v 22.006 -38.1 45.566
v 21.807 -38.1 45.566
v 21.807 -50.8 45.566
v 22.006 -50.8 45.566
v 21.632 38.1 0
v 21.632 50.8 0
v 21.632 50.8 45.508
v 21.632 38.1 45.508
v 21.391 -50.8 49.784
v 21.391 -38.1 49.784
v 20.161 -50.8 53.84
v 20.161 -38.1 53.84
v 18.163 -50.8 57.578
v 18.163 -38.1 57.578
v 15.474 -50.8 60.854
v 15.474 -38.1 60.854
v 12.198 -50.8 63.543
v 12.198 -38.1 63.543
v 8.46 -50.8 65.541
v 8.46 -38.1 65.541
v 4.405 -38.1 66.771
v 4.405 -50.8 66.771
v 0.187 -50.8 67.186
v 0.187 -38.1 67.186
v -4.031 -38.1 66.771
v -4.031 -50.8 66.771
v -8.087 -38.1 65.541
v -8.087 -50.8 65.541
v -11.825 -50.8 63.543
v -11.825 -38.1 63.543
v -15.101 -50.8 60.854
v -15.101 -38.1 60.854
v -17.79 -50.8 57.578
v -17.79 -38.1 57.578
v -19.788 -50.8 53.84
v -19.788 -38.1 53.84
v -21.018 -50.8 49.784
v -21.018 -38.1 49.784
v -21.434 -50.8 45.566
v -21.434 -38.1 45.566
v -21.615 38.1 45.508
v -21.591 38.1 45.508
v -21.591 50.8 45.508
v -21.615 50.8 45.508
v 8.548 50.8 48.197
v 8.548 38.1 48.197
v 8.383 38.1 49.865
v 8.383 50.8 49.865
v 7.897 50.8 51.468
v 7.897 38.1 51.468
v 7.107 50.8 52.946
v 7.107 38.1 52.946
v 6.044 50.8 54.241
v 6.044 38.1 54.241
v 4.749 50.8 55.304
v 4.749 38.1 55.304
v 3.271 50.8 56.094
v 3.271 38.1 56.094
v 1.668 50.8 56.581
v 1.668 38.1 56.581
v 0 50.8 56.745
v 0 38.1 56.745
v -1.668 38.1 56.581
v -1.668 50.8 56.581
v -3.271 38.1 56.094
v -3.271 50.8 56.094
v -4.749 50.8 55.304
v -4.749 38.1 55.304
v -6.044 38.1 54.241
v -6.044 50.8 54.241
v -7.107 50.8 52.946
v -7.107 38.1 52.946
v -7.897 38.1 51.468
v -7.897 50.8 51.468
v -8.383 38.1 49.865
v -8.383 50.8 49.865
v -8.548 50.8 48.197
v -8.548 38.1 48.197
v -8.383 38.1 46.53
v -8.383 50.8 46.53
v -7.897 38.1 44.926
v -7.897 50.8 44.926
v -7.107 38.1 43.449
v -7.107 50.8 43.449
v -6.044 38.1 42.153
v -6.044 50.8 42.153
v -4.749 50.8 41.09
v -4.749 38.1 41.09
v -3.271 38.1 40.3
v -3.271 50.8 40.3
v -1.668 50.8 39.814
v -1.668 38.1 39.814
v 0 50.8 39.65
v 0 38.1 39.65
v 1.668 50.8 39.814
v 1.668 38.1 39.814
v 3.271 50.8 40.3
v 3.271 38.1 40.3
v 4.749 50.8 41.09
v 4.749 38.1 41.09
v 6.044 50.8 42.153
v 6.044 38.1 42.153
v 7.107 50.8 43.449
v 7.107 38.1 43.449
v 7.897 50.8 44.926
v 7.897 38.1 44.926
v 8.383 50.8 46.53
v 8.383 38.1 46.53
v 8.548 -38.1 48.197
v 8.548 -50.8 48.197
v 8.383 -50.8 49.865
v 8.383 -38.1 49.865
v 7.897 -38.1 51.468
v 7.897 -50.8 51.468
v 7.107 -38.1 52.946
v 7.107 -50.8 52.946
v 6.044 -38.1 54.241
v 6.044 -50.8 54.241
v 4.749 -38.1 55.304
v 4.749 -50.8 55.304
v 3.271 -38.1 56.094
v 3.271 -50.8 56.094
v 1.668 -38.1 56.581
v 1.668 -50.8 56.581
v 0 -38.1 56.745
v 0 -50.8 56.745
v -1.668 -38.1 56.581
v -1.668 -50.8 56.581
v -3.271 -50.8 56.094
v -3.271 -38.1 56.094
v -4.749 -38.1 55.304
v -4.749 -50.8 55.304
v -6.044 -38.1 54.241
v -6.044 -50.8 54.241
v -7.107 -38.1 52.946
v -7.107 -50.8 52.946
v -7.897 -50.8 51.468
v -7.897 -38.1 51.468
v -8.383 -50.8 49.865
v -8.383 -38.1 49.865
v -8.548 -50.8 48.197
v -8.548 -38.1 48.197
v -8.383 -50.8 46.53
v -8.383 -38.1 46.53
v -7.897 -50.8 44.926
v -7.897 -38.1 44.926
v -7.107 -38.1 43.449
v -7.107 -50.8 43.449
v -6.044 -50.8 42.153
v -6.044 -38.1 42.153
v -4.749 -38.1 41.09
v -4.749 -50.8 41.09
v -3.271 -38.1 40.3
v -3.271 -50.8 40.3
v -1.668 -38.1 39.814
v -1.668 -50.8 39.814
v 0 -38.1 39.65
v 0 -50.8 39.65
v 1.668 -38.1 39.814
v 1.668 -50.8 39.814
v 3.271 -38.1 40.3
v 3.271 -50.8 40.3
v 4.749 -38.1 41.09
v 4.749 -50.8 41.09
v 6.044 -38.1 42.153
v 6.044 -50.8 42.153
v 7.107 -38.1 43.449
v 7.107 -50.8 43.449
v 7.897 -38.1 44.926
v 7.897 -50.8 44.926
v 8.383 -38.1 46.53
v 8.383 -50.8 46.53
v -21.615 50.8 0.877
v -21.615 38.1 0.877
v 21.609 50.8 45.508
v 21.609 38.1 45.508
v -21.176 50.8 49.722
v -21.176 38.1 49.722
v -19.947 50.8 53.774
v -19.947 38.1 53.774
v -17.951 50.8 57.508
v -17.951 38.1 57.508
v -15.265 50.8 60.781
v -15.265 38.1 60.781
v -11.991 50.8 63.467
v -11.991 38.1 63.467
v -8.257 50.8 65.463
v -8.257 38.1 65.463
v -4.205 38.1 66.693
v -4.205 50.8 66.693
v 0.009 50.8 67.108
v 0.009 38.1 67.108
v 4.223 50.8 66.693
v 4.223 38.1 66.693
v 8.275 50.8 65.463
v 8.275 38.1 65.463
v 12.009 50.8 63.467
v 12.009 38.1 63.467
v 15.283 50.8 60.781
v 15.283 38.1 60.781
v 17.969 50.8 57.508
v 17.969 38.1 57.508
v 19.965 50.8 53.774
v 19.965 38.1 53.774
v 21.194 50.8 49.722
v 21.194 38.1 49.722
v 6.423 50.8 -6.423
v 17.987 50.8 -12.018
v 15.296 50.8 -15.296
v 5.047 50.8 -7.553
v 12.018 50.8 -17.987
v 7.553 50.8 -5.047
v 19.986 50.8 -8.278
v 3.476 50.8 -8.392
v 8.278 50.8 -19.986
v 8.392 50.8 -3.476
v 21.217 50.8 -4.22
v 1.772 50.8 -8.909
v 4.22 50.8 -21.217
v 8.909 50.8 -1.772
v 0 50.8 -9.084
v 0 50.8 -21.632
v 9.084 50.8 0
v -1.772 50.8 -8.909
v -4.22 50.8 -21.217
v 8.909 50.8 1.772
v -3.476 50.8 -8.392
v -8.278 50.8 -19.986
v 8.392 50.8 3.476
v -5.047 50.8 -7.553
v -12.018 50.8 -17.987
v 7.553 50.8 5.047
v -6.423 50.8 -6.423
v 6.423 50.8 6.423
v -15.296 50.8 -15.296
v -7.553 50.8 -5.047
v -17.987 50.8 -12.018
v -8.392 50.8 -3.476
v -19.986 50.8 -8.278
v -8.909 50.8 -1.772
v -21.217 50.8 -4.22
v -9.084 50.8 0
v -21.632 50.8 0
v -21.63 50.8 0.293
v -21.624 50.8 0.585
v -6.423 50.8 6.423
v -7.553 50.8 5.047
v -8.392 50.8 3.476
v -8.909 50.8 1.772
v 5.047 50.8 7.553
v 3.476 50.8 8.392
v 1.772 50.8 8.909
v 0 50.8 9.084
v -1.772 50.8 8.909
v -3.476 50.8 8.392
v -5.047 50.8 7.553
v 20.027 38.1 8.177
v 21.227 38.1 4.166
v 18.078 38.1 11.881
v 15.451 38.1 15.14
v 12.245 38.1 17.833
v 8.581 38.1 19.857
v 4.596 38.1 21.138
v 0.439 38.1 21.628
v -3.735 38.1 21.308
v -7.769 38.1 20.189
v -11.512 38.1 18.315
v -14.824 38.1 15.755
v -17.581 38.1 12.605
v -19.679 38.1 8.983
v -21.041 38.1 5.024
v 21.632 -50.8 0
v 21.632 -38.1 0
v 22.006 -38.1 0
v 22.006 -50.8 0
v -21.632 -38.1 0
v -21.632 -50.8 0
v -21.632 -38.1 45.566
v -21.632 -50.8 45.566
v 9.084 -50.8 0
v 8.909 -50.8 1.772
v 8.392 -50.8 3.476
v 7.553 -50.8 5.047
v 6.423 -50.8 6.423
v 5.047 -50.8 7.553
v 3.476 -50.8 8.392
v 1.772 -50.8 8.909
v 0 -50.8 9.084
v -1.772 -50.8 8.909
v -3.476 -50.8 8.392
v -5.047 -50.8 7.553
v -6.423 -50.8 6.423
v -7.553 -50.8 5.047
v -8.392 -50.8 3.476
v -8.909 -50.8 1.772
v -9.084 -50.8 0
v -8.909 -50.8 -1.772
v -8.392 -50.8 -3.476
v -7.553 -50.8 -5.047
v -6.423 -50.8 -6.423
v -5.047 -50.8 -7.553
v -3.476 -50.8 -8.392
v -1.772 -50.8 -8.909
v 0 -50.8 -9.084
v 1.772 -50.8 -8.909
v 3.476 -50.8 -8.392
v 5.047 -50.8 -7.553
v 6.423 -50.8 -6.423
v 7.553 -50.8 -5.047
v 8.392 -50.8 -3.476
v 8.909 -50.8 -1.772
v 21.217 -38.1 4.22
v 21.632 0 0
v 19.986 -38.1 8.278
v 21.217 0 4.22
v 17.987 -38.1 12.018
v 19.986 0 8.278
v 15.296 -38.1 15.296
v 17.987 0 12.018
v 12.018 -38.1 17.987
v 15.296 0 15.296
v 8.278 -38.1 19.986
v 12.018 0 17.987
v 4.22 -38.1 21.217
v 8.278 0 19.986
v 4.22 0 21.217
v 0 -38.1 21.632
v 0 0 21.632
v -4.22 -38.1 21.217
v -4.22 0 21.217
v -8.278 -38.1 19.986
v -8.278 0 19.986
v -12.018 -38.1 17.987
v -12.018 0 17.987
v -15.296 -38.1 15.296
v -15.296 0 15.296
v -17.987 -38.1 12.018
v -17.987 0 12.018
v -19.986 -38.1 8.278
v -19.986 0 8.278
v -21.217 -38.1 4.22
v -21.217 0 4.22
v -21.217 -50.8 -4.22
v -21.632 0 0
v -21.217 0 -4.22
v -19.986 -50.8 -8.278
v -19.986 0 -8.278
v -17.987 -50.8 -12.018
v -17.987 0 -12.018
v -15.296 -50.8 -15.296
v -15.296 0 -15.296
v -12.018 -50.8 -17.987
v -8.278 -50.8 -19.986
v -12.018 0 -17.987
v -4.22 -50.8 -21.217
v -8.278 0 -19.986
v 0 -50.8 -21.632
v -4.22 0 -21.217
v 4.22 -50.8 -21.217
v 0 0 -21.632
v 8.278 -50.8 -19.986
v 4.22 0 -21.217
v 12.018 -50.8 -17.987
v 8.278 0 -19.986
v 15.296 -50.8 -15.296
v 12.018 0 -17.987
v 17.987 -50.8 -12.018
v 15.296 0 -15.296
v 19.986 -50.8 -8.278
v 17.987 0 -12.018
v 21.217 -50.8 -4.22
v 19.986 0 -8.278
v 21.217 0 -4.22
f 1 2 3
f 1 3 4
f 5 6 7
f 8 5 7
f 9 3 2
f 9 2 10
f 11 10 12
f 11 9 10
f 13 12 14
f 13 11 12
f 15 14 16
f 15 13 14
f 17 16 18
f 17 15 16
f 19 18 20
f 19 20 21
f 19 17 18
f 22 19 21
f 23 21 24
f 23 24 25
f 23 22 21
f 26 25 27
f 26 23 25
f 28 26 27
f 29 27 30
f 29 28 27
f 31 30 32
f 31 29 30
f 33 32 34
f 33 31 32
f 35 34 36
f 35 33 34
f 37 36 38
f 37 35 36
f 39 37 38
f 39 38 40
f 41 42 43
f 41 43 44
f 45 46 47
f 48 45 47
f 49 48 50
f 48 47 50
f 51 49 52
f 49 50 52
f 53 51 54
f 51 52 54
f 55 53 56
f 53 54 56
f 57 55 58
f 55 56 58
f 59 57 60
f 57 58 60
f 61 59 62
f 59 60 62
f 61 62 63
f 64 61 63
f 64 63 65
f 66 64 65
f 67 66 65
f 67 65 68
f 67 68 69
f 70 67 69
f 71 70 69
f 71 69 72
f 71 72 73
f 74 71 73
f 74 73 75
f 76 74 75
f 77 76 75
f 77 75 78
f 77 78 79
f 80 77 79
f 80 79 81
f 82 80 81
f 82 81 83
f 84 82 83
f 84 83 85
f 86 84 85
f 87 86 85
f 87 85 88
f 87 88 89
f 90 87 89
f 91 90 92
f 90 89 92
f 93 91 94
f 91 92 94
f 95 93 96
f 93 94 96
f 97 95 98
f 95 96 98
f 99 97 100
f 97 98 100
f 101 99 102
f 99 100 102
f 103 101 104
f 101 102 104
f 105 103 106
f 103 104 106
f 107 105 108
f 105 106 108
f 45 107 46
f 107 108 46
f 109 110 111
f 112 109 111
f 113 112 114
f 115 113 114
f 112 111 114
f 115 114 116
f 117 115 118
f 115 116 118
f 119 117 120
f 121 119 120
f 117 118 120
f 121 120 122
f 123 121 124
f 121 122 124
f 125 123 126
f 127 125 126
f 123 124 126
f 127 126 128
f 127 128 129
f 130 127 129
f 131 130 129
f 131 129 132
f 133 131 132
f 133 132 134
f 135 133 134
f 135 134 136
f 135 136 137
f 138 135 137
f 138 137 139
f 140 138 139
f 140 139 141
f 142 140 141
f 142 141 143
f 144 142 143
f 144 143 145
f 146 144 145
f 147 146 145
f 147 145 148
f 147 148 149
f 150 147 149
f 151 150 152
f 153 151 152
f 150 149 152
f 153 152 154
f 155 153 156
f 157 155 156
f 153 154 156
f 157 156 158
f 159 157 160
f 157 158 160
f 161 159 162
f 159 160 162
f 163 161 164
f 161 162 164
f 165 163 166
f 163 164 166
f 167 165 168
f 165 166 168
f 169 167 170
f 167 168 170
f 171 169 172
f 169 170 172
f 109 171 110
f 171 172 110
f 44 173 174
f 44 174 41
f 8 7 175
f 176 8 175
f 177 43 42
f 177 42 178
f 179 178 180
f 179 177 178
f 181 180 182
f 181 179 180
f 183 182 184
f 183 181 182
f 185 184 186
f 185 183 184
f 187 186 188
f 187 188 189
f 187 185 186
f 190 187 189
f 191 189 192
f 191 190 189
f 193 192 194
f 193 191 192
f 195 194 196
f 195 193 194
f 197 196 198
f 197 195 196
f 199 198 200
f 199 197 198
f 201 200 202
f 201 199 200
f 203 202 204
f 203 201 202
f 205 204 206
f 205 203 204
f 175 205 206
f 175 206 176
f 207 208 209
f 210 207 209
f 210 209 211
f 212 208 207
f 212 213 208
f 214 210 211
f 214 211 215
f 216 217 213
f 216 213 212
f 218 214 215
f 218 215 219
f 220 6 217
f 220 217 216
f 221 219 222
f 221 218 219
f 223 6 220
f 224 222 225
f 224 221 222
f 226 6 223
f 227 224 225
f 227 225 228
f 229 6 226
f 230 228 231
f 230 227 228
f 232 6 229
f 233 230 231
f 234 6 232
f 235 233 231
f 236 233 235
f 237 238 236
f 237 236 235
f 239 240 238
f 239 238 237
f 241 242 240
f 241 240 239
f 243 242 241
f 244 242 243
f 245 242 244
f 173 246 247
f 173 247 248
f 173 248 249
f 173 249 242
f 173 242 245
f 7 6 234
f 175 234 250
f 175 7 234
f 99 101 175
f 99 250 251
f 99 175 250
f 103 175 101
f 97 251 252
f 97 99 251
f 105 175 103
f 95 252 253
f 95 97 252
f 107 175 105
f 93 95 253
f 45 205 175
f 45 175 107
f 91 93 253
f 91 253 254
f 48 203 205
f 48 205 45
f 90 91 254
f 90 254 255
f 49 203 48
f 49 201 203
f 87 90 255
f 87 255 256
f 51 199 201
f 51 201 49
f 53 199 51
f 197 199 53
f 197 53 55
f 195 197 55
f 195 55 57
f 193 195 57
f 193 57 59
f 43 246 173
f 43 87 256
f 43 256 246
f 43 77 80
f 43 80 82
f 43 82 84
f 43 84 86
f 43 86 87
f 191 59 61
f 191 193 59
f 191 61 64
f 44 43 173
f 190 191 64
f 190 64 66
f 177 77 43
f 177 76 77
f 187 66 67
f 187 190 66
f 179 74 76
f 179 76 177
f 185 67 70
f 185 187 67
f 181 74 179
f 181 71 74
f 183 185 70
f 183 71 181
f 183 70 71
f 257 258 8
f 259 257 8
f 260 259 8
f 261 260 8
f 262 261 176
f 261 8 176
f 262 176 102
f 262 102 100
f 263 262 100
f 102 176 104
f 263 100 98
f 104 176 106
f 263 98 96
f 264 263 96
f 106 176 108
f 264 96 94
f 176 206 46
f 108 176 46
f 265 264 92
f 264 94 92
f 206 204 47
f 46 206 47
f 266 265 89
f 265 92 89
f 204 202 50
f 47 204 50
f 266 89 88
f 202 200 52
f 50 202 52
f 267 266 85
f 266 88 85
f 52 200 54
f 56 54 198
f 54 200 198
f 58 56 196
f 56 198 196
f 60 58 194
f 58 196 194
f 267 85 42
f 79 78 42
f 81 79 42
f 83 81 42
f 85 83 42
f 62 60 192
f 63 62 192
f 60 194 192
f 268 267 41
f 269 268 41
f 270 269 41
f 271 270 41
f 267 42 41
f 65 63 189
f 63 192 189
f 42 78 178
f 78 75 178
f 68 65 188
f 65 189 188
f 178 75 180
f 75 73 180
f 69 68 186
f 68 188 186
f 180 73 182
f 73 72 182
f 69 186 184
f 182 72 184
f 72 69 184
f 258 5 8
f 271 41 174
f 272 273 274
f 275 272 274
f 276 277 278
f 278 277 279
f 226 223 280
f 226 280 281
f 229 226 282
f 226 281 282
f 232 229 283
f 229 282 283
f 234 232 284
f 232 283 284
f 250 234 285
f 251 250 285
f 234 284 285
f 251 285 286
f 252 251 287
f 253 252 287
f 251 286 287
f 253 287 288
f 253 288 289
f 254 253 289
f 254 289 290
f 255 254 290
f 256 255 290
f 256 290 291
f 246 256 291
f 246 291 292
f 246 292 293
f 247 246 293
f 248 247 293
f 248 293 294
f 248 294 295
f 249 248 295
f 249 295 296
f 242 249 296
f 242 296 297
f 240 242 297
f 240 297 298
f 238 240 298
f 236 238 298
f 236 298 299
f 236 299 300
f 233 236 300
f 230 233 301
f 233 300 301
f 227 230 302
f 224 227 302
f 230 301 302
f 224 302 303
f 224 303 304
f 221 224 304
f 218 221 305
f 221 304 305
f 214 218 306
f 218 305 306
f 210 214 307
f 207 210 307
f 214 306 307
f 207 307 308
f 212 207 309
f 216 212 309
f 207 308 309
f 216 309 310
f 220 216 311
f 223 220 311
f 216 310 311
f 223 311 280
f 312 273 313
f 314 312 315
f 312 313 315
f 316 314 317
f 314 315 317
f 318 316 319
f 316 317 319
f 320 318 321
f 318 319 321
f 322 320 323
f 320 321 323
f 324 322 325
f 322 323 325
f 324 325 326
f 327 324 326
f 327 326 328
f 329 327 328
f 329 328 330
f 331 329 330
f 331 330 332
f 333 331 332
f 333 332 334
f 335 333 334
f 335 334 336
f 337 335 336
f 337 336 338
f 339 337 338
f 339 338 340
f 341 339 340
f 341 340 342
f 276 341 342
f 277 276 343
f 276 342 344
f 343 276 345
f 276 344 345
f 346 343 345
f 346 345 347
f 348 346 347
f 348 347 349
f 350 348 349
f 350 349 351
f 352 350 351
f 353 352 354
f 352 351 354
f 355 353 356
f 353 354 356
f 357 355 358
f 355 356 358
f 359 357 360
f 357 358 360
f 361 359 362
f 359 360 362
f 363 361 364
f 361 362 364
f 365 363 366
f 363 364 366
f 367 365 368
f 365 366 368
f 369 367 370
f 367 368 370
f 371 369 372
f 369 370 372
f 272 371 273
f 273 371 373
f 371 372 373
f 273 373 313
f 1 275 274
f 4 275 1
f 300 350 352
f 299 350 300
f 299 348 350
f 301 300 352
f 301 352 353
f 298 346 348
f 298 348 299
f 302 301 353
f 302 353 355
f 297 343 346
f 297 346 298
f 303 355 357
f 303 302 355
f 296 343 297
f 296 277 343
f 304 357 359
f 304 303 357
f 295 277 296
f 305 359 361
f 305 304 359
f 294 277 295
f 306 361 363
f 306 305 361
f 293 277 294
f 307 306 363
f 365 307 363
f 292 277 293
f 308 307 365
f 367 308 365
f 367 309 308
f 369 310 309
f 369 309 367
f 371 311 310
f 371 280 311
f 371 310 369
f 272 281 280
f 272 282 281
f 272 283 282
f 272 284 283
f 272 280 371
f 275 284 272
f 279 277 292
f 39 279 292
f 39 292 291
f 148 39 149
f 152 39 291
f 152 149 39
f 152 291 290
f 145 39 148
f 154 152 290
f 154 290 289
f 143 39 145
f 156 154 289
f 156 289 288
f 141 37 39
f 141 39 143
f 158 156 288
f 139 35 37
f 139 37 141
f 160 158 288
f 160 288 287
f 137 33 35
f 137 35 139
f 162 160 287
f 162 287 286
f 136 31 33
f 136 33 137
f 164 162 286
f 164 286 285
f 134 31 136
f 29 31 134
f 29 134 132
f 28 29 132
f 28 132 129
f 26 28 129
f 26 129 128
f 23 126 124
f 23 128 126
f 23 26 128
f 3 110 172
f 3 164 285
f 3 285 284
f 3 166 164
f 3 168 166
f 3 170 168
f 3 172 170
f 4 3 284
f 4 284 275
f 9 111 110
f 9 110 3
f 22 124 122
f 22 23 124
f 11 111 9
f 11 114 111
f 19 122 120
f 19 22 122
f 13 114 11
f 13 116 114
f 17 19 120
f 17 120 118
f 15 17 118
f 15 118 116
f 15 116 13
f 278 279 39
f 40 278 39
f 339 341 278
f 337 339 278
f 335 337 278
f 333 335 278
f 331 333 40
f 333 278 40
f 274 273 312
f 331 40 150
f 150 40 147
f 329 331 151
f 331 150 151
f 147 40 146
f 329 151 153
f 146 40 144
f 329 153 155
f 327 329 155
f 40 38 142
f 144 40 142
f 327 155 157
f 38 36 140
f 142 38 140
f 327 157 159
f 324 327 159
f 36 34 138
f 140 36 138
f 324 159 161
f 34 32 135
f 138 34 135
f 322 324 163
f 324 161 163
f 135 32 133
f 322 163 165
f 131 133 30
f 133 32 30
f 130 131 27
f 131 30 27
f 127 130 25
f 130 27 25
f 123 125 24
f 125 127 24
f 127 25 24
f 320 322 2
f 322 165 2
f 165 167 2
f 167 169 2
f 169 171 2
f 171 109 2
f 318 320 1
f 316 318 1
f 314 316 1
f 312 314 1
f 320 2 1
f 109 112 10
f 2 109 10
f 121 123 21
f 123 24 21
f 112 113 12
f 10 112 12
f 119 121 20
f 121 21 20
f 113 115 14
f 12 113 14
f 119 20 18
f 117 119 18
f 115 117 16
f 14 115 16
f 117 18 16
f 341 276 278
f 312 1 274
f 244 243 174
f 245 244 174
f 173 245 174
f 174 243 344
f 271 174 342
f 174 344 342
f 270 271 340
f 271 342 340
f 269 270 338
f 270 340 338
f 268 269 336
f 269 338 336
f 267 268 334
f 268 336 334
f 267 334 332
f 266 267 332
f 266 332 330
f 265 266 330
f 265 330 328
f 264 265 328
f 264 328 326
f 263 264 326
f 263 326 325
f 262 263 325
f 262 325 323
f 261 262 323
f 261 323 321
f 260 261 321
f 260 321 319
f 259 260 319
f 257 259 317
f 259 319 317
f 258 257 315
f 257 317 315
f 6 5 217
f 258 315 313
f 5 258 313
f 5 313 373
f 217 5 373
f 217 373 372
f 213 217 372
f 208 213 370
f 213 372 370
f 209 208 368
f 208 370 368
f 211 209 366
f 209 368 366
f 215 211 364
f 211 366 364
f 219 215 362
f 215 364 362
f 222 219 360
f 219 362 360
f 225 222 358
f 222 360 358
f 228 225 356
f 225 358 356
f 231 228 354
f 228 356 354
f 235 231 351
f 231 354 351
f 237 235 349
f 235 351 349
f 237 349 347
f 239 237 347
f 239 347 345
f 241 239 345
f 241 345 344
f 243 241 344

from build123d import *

# Parameters (mm, degrees)
F0_R      = 21.6324082339
F1_DEPTH  = 50.8
F2_R      = 21.6324082339
F3_DEPTH  = 50.8
F4_W      = 43.638148787
F4_H      = 45.5662310123
F5_DEPTH  = 12.7
F6_R      = 21.6201983054
F7_DEPTH  = 12.7
F8_W      = 43.2470137948
F8_H      = 45.5075465143
F9_DEPTH  = 12.7
F10_R     = 21.600140632
F11_DEPTH = 12.7
F12_R     = 9.0838177262
F13_DEPTH = 101.601
F14_R     = 8.547587073
F15_DEPTH = 101.601


with BuildPart() as f1:
    # F0 (on Front) → F1 (new body)
    with BuildSketch(Plane.XZ):
        Circle(F0_R)
    extrude(amount=F1_DEPTH)

    # F2 (on face) → F3 (join)
    with BuildSketch(Plane(origin=(0, 0, 0), x_dir=(-1, 0, 0), z_dir=(0, 1, 0))):
        Circle(F2_R)
    extrude(amount=F3_DEPTH)

    # F4 (on face) → F5 (join)
    with BuildSketch(Plane.XZ.offset(50.8)):
        with Locations((0.1866661596, 22.7831155062)):
            Rectangle(F4_W, F4_H)
    extrude(amount=-F5_DEPTH)

    # F6 (on face) → F7 (join)
    with BuildSketch(Plane.XZ.offset(50.8)):
        with Locations((0.1866661596, 45.5662310123)):
            Circle(F6_R)
    extrude(amount=-F7_DEPTH)

    # F8 (on face) → F9 (join)
    with BuildSketch(Plane(origin=(0, 50.8, 0), x_dir=(-1, 0, 0), z_dir=(0, 1, 0))):
        with Locations((-0.0089013365, 22.7537732571)):
            Rectangle(F8_W, F8_H)
    extrude(amount=-F9_DEPTH)

    # F10 (on face) → F11 (join)
    with BuildSketch(Plane(origin=(0, 50.8, 0), x_dir=(-1, 0, 0), z_dir=(0, 1, 0))):
        with Locations((-0.0089013365, 45.5075465143)):
            Circle(F10_R)
    extrude(amount=-F11_DEPTH)

    # F12 (on face) → F13 (cut, through all)
    with BuildSketch(Plane.XZ.offset(50.8)):
        Circle(F12_R)
    extrude(amount=-F13_DEPTH, mode=Mode.SUBTRACT)

    # F14 (on face) → F15 (cut, through all)
    with BuildSketch(Plane.XZ.offset(50.8)):
        with Locations((0, 48.1973513961)):
            Circle(F14_R)
    extrude(amount=-F15_DEPTH, mode=Mode.SUBTRACT)


solid = f1.part
